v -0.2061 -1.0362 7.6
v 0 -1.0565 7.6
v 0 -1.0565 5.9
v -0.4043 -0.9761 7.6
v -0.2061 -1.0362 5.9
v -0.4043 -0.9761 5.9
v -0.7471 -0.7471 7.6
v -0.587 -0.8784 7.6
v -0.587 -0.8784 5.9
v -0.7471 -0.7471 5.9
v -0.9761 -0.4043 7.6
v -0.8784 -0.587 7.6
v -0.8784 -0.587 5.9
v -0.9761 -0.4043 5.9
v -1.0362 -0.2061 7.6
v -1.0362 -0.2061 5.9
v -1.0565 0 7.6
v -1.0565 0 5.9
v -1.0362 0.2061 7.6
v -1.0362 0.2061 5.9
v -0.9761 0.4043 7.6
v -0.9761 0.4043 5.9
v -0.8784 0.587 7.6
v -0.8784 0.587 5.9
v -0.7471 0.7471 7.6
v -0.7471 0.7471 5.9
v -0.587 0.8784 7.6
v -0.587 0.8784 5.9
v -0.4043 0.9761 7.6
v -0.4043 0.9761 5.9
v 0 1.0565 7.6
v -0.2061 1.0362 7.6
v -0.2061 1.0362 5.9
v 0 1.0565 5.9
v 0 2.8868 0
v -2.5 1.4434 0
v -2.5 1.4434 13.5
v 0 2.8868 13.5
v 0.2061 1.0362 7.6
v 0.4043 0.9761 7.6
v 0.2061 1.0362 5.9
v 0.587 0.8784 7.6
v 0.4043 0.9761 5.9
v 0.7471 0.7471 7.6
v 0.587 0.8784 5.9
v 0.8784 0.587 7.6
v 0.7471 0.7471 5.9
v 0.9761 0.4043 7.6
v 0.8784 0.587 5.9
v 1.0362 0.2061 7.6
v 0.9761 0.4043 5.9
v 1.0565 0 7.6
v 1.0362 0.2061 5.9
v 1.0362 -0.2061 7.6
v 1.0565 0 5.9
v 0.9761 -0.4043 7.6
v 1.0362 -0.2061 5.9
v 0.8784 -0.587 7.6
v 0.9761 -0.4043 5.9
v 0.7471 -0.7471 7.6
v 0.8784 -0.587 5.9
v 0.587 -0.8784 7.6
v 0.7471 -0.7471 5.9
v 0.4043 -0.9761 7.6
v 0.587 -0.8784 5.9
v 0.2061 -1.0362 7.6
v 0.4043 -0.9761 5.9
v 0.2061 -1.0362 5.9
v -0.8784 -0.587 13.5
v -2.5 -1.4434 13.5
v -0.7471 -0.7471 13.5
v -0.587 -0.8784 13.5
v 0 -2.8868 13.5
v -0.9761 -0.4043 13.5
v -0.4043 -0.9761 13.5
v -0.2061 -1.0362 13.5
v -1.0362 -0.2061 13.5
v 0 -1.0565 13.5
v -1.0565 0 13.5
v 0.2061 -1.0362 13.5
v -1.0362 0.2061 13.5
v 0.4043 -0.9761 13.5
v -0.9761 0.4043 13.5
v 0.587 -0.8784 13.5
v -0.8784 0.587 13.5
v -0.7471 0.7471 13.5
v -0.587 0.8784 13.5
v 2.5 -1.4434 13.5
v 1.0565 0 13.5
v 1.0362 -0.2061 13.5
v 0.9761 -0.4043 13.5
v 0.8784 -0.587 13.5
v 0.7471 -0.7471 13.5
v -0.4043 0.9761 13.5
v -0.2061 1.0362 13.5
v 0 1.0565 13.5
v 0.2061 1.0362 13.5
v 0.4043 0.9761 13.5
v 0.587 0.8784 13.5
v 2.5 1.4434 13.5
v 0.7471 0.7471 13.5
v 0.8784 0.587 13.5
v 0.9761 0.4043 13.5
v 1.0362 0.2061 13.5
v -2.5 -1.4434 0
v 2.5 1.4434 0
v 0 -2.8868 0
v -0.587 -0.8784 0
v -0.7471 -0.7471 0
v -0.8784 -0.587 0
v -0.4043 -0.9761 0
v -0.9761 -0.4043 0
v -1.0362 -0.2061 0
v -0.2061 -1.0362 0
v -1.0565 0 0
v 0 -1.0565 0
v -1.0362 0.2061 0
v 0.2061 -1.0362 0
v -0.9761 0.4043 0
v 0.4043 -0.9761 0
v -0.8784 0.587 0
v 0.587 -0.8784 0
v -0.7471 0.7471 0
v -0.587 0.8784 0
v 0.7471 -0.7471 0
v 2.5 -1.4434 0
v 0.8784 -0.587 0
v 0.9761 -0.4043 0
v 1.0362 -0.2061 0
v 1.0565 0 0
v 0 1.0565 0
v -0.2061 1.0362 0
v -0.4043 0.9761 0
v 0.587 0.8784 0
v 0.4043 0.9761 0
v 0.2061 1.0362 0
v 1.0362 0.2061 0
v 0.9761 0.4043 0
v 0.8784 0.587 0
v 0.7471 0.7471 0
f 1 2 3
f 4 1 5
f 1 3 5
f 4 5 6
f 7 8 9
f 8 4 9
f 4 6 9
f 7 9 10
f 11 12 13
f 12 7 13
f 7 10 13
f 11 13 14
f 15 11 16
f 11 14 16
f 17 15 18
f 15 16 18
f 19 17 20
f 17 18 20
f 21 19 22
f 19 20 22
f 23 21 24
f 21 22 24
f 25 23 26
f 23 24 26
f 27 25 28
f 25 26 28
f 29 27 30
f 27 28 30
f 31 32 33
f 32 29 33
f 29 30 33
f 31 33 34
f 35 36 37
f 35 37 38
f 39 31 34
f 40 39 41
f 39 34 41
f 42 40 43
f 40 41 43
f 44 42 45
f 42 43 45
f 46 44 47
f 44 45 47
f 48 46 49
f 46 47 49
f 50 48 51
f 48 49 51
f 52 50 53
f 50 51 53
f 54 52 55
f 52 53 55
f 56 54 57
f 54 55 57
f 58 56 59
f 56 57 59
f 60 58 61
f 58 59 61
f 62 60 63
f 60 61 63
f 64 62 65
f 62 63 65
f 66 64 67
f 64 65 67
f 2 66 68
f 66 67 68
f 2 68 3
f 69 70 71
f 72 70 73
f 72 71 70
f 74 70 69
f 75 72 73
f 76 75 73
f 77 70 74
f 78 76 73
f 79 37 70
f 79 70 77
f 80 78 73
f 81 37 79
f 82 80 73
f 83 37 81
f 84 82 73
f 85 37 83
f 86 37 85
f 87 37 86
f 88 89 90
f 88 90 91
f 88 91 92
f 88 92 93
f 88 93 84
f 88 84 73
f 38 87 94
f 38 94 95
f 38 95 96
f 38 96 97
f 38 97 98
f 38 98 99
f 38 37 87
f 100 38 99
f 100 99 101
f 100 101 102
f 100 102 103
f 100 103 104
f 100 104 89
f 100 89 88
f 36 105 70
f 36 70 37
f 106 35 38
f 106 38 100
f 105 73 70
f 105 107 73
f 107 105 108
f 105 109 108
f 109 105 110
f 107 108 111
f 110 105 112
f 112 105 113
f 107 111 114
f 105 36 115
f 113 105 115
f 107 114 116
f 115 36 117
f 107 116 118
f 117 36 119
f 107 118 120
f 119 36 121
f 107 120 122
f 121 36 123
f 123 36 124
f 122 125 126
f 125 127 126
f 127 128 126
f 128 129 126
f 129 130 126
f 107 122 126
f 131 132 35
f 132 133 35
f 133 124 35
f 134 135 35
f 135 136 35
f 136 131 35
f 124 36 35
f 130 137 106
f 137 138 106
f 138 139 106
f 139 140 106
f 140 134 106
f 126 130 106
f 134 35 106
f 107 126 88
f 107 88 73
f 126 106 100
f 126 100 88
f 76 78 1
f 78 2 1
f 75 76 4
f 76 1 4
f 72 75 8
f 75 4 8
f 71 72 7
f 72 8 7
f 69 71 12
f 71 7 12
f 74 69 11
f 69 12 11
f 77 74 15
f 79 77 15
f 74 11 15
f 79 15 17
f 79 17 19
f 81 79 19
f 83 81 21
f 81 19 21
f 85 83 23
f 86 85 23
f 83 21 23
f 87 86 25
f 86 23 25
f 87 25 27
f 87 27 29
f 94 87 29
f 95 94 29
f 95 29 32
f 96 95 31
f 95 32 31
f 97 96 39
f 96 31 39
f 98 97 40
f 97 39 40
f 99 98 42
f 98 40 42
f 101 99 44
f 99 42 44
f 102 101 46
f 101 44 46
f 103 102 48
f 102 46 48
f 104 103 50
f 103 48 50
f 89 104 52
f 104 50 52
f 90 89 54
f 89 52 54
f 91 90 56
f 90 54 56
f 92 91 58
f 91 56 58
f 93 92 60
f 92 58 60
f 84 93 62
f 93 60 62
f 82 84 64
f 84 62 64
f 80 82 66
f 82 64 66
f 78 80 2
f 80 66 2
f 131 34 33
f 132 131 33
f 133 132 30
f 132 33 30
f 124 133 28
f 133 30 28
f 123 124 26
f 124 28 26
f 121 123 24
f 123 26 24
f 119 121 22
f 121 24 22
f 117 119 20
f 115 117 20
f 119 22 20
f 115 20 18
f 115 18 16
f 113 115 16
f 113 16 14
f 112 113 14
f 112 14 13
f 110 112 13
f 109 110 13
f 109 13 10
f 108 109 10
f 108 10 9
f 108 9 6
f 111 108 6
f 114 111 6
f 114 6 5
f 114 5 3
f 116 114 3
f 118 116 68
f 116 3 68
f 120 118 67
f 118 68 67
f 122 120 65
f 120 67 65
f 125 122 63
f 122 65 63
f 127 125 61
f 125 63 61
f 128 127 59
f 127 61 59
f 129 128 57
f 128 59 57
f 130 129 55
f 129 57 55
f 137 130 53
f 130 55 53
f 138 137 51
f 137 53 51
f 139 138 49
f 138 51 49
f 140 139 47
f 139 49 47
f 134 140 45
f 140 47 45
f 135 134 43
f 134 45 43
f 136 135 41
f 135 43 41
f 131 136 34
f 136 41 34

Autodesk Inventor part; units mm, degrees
ref_plane "YZ Plane" through (0, 0, 0) normal (1, 0, 0) x (0, 1, 0)
ref_plane "XZ Plane" through (0, 0, 0) normal (0, 1, 0) x (-1, 0, 0)
ref_plane "XY Plane" through (0, 0, 0) normal (0, 0, 1) x (1, 0, 0)
sketch "スケッチ1" plane through (0, 0, 0) normal (0, 0, 1) x (1, 0, 0)
  line L0 (0, 2.8868) -> (2.5, 1.4434)
  line L1 (2.5, 1.4434) -> (2.5, -1.4434)
  line L2 (2.5, -1.4434) -> (0, -2.8868)
  line L3 (0, -2.8868) -> (-2.5, -1.4434)
  line L4 (-2.5, -1.4434) -> (-2.5, 1.4434)
  line L5 (-2.5, 1.4434) -> (0, 2.8868)
  point P0 (0, 0)
  point P1 (0, 0)
  dimension "d0" = 5
extrude "押し出し1" add sketch "スケッチ1" along normal blind 13.5
sketch "スケッチ2" plane through (0, 0, 13.5) normal (0, 0, 1) x (1, 0, 0)
  point P0 (0, 0)
hole "穴1" at (0, 0, 13.5) direction (0, 0, -1) diameter 2.113 depth 7.6 tip angle 118 thread size "M2.6x0.45" class "6H" standard "ISO Metric profile"
sketch "スケッチ3" plane through (0, 0, 0) normal (0, 0, -1) x (-1, 0, 0)
  point P0 (0, 0)
hole "穴2" at (0, 0, 0) direction (0, 0, 1) diameter 2.113 depth 7.6 tip angle 118 thread size "M2.6x0.45" class "6H" standard "ISO Metric profile"
properties part number "黄銅スペーサー（六角）_ASB-2613.5E" material "真鍮、ソフト イエロー"
